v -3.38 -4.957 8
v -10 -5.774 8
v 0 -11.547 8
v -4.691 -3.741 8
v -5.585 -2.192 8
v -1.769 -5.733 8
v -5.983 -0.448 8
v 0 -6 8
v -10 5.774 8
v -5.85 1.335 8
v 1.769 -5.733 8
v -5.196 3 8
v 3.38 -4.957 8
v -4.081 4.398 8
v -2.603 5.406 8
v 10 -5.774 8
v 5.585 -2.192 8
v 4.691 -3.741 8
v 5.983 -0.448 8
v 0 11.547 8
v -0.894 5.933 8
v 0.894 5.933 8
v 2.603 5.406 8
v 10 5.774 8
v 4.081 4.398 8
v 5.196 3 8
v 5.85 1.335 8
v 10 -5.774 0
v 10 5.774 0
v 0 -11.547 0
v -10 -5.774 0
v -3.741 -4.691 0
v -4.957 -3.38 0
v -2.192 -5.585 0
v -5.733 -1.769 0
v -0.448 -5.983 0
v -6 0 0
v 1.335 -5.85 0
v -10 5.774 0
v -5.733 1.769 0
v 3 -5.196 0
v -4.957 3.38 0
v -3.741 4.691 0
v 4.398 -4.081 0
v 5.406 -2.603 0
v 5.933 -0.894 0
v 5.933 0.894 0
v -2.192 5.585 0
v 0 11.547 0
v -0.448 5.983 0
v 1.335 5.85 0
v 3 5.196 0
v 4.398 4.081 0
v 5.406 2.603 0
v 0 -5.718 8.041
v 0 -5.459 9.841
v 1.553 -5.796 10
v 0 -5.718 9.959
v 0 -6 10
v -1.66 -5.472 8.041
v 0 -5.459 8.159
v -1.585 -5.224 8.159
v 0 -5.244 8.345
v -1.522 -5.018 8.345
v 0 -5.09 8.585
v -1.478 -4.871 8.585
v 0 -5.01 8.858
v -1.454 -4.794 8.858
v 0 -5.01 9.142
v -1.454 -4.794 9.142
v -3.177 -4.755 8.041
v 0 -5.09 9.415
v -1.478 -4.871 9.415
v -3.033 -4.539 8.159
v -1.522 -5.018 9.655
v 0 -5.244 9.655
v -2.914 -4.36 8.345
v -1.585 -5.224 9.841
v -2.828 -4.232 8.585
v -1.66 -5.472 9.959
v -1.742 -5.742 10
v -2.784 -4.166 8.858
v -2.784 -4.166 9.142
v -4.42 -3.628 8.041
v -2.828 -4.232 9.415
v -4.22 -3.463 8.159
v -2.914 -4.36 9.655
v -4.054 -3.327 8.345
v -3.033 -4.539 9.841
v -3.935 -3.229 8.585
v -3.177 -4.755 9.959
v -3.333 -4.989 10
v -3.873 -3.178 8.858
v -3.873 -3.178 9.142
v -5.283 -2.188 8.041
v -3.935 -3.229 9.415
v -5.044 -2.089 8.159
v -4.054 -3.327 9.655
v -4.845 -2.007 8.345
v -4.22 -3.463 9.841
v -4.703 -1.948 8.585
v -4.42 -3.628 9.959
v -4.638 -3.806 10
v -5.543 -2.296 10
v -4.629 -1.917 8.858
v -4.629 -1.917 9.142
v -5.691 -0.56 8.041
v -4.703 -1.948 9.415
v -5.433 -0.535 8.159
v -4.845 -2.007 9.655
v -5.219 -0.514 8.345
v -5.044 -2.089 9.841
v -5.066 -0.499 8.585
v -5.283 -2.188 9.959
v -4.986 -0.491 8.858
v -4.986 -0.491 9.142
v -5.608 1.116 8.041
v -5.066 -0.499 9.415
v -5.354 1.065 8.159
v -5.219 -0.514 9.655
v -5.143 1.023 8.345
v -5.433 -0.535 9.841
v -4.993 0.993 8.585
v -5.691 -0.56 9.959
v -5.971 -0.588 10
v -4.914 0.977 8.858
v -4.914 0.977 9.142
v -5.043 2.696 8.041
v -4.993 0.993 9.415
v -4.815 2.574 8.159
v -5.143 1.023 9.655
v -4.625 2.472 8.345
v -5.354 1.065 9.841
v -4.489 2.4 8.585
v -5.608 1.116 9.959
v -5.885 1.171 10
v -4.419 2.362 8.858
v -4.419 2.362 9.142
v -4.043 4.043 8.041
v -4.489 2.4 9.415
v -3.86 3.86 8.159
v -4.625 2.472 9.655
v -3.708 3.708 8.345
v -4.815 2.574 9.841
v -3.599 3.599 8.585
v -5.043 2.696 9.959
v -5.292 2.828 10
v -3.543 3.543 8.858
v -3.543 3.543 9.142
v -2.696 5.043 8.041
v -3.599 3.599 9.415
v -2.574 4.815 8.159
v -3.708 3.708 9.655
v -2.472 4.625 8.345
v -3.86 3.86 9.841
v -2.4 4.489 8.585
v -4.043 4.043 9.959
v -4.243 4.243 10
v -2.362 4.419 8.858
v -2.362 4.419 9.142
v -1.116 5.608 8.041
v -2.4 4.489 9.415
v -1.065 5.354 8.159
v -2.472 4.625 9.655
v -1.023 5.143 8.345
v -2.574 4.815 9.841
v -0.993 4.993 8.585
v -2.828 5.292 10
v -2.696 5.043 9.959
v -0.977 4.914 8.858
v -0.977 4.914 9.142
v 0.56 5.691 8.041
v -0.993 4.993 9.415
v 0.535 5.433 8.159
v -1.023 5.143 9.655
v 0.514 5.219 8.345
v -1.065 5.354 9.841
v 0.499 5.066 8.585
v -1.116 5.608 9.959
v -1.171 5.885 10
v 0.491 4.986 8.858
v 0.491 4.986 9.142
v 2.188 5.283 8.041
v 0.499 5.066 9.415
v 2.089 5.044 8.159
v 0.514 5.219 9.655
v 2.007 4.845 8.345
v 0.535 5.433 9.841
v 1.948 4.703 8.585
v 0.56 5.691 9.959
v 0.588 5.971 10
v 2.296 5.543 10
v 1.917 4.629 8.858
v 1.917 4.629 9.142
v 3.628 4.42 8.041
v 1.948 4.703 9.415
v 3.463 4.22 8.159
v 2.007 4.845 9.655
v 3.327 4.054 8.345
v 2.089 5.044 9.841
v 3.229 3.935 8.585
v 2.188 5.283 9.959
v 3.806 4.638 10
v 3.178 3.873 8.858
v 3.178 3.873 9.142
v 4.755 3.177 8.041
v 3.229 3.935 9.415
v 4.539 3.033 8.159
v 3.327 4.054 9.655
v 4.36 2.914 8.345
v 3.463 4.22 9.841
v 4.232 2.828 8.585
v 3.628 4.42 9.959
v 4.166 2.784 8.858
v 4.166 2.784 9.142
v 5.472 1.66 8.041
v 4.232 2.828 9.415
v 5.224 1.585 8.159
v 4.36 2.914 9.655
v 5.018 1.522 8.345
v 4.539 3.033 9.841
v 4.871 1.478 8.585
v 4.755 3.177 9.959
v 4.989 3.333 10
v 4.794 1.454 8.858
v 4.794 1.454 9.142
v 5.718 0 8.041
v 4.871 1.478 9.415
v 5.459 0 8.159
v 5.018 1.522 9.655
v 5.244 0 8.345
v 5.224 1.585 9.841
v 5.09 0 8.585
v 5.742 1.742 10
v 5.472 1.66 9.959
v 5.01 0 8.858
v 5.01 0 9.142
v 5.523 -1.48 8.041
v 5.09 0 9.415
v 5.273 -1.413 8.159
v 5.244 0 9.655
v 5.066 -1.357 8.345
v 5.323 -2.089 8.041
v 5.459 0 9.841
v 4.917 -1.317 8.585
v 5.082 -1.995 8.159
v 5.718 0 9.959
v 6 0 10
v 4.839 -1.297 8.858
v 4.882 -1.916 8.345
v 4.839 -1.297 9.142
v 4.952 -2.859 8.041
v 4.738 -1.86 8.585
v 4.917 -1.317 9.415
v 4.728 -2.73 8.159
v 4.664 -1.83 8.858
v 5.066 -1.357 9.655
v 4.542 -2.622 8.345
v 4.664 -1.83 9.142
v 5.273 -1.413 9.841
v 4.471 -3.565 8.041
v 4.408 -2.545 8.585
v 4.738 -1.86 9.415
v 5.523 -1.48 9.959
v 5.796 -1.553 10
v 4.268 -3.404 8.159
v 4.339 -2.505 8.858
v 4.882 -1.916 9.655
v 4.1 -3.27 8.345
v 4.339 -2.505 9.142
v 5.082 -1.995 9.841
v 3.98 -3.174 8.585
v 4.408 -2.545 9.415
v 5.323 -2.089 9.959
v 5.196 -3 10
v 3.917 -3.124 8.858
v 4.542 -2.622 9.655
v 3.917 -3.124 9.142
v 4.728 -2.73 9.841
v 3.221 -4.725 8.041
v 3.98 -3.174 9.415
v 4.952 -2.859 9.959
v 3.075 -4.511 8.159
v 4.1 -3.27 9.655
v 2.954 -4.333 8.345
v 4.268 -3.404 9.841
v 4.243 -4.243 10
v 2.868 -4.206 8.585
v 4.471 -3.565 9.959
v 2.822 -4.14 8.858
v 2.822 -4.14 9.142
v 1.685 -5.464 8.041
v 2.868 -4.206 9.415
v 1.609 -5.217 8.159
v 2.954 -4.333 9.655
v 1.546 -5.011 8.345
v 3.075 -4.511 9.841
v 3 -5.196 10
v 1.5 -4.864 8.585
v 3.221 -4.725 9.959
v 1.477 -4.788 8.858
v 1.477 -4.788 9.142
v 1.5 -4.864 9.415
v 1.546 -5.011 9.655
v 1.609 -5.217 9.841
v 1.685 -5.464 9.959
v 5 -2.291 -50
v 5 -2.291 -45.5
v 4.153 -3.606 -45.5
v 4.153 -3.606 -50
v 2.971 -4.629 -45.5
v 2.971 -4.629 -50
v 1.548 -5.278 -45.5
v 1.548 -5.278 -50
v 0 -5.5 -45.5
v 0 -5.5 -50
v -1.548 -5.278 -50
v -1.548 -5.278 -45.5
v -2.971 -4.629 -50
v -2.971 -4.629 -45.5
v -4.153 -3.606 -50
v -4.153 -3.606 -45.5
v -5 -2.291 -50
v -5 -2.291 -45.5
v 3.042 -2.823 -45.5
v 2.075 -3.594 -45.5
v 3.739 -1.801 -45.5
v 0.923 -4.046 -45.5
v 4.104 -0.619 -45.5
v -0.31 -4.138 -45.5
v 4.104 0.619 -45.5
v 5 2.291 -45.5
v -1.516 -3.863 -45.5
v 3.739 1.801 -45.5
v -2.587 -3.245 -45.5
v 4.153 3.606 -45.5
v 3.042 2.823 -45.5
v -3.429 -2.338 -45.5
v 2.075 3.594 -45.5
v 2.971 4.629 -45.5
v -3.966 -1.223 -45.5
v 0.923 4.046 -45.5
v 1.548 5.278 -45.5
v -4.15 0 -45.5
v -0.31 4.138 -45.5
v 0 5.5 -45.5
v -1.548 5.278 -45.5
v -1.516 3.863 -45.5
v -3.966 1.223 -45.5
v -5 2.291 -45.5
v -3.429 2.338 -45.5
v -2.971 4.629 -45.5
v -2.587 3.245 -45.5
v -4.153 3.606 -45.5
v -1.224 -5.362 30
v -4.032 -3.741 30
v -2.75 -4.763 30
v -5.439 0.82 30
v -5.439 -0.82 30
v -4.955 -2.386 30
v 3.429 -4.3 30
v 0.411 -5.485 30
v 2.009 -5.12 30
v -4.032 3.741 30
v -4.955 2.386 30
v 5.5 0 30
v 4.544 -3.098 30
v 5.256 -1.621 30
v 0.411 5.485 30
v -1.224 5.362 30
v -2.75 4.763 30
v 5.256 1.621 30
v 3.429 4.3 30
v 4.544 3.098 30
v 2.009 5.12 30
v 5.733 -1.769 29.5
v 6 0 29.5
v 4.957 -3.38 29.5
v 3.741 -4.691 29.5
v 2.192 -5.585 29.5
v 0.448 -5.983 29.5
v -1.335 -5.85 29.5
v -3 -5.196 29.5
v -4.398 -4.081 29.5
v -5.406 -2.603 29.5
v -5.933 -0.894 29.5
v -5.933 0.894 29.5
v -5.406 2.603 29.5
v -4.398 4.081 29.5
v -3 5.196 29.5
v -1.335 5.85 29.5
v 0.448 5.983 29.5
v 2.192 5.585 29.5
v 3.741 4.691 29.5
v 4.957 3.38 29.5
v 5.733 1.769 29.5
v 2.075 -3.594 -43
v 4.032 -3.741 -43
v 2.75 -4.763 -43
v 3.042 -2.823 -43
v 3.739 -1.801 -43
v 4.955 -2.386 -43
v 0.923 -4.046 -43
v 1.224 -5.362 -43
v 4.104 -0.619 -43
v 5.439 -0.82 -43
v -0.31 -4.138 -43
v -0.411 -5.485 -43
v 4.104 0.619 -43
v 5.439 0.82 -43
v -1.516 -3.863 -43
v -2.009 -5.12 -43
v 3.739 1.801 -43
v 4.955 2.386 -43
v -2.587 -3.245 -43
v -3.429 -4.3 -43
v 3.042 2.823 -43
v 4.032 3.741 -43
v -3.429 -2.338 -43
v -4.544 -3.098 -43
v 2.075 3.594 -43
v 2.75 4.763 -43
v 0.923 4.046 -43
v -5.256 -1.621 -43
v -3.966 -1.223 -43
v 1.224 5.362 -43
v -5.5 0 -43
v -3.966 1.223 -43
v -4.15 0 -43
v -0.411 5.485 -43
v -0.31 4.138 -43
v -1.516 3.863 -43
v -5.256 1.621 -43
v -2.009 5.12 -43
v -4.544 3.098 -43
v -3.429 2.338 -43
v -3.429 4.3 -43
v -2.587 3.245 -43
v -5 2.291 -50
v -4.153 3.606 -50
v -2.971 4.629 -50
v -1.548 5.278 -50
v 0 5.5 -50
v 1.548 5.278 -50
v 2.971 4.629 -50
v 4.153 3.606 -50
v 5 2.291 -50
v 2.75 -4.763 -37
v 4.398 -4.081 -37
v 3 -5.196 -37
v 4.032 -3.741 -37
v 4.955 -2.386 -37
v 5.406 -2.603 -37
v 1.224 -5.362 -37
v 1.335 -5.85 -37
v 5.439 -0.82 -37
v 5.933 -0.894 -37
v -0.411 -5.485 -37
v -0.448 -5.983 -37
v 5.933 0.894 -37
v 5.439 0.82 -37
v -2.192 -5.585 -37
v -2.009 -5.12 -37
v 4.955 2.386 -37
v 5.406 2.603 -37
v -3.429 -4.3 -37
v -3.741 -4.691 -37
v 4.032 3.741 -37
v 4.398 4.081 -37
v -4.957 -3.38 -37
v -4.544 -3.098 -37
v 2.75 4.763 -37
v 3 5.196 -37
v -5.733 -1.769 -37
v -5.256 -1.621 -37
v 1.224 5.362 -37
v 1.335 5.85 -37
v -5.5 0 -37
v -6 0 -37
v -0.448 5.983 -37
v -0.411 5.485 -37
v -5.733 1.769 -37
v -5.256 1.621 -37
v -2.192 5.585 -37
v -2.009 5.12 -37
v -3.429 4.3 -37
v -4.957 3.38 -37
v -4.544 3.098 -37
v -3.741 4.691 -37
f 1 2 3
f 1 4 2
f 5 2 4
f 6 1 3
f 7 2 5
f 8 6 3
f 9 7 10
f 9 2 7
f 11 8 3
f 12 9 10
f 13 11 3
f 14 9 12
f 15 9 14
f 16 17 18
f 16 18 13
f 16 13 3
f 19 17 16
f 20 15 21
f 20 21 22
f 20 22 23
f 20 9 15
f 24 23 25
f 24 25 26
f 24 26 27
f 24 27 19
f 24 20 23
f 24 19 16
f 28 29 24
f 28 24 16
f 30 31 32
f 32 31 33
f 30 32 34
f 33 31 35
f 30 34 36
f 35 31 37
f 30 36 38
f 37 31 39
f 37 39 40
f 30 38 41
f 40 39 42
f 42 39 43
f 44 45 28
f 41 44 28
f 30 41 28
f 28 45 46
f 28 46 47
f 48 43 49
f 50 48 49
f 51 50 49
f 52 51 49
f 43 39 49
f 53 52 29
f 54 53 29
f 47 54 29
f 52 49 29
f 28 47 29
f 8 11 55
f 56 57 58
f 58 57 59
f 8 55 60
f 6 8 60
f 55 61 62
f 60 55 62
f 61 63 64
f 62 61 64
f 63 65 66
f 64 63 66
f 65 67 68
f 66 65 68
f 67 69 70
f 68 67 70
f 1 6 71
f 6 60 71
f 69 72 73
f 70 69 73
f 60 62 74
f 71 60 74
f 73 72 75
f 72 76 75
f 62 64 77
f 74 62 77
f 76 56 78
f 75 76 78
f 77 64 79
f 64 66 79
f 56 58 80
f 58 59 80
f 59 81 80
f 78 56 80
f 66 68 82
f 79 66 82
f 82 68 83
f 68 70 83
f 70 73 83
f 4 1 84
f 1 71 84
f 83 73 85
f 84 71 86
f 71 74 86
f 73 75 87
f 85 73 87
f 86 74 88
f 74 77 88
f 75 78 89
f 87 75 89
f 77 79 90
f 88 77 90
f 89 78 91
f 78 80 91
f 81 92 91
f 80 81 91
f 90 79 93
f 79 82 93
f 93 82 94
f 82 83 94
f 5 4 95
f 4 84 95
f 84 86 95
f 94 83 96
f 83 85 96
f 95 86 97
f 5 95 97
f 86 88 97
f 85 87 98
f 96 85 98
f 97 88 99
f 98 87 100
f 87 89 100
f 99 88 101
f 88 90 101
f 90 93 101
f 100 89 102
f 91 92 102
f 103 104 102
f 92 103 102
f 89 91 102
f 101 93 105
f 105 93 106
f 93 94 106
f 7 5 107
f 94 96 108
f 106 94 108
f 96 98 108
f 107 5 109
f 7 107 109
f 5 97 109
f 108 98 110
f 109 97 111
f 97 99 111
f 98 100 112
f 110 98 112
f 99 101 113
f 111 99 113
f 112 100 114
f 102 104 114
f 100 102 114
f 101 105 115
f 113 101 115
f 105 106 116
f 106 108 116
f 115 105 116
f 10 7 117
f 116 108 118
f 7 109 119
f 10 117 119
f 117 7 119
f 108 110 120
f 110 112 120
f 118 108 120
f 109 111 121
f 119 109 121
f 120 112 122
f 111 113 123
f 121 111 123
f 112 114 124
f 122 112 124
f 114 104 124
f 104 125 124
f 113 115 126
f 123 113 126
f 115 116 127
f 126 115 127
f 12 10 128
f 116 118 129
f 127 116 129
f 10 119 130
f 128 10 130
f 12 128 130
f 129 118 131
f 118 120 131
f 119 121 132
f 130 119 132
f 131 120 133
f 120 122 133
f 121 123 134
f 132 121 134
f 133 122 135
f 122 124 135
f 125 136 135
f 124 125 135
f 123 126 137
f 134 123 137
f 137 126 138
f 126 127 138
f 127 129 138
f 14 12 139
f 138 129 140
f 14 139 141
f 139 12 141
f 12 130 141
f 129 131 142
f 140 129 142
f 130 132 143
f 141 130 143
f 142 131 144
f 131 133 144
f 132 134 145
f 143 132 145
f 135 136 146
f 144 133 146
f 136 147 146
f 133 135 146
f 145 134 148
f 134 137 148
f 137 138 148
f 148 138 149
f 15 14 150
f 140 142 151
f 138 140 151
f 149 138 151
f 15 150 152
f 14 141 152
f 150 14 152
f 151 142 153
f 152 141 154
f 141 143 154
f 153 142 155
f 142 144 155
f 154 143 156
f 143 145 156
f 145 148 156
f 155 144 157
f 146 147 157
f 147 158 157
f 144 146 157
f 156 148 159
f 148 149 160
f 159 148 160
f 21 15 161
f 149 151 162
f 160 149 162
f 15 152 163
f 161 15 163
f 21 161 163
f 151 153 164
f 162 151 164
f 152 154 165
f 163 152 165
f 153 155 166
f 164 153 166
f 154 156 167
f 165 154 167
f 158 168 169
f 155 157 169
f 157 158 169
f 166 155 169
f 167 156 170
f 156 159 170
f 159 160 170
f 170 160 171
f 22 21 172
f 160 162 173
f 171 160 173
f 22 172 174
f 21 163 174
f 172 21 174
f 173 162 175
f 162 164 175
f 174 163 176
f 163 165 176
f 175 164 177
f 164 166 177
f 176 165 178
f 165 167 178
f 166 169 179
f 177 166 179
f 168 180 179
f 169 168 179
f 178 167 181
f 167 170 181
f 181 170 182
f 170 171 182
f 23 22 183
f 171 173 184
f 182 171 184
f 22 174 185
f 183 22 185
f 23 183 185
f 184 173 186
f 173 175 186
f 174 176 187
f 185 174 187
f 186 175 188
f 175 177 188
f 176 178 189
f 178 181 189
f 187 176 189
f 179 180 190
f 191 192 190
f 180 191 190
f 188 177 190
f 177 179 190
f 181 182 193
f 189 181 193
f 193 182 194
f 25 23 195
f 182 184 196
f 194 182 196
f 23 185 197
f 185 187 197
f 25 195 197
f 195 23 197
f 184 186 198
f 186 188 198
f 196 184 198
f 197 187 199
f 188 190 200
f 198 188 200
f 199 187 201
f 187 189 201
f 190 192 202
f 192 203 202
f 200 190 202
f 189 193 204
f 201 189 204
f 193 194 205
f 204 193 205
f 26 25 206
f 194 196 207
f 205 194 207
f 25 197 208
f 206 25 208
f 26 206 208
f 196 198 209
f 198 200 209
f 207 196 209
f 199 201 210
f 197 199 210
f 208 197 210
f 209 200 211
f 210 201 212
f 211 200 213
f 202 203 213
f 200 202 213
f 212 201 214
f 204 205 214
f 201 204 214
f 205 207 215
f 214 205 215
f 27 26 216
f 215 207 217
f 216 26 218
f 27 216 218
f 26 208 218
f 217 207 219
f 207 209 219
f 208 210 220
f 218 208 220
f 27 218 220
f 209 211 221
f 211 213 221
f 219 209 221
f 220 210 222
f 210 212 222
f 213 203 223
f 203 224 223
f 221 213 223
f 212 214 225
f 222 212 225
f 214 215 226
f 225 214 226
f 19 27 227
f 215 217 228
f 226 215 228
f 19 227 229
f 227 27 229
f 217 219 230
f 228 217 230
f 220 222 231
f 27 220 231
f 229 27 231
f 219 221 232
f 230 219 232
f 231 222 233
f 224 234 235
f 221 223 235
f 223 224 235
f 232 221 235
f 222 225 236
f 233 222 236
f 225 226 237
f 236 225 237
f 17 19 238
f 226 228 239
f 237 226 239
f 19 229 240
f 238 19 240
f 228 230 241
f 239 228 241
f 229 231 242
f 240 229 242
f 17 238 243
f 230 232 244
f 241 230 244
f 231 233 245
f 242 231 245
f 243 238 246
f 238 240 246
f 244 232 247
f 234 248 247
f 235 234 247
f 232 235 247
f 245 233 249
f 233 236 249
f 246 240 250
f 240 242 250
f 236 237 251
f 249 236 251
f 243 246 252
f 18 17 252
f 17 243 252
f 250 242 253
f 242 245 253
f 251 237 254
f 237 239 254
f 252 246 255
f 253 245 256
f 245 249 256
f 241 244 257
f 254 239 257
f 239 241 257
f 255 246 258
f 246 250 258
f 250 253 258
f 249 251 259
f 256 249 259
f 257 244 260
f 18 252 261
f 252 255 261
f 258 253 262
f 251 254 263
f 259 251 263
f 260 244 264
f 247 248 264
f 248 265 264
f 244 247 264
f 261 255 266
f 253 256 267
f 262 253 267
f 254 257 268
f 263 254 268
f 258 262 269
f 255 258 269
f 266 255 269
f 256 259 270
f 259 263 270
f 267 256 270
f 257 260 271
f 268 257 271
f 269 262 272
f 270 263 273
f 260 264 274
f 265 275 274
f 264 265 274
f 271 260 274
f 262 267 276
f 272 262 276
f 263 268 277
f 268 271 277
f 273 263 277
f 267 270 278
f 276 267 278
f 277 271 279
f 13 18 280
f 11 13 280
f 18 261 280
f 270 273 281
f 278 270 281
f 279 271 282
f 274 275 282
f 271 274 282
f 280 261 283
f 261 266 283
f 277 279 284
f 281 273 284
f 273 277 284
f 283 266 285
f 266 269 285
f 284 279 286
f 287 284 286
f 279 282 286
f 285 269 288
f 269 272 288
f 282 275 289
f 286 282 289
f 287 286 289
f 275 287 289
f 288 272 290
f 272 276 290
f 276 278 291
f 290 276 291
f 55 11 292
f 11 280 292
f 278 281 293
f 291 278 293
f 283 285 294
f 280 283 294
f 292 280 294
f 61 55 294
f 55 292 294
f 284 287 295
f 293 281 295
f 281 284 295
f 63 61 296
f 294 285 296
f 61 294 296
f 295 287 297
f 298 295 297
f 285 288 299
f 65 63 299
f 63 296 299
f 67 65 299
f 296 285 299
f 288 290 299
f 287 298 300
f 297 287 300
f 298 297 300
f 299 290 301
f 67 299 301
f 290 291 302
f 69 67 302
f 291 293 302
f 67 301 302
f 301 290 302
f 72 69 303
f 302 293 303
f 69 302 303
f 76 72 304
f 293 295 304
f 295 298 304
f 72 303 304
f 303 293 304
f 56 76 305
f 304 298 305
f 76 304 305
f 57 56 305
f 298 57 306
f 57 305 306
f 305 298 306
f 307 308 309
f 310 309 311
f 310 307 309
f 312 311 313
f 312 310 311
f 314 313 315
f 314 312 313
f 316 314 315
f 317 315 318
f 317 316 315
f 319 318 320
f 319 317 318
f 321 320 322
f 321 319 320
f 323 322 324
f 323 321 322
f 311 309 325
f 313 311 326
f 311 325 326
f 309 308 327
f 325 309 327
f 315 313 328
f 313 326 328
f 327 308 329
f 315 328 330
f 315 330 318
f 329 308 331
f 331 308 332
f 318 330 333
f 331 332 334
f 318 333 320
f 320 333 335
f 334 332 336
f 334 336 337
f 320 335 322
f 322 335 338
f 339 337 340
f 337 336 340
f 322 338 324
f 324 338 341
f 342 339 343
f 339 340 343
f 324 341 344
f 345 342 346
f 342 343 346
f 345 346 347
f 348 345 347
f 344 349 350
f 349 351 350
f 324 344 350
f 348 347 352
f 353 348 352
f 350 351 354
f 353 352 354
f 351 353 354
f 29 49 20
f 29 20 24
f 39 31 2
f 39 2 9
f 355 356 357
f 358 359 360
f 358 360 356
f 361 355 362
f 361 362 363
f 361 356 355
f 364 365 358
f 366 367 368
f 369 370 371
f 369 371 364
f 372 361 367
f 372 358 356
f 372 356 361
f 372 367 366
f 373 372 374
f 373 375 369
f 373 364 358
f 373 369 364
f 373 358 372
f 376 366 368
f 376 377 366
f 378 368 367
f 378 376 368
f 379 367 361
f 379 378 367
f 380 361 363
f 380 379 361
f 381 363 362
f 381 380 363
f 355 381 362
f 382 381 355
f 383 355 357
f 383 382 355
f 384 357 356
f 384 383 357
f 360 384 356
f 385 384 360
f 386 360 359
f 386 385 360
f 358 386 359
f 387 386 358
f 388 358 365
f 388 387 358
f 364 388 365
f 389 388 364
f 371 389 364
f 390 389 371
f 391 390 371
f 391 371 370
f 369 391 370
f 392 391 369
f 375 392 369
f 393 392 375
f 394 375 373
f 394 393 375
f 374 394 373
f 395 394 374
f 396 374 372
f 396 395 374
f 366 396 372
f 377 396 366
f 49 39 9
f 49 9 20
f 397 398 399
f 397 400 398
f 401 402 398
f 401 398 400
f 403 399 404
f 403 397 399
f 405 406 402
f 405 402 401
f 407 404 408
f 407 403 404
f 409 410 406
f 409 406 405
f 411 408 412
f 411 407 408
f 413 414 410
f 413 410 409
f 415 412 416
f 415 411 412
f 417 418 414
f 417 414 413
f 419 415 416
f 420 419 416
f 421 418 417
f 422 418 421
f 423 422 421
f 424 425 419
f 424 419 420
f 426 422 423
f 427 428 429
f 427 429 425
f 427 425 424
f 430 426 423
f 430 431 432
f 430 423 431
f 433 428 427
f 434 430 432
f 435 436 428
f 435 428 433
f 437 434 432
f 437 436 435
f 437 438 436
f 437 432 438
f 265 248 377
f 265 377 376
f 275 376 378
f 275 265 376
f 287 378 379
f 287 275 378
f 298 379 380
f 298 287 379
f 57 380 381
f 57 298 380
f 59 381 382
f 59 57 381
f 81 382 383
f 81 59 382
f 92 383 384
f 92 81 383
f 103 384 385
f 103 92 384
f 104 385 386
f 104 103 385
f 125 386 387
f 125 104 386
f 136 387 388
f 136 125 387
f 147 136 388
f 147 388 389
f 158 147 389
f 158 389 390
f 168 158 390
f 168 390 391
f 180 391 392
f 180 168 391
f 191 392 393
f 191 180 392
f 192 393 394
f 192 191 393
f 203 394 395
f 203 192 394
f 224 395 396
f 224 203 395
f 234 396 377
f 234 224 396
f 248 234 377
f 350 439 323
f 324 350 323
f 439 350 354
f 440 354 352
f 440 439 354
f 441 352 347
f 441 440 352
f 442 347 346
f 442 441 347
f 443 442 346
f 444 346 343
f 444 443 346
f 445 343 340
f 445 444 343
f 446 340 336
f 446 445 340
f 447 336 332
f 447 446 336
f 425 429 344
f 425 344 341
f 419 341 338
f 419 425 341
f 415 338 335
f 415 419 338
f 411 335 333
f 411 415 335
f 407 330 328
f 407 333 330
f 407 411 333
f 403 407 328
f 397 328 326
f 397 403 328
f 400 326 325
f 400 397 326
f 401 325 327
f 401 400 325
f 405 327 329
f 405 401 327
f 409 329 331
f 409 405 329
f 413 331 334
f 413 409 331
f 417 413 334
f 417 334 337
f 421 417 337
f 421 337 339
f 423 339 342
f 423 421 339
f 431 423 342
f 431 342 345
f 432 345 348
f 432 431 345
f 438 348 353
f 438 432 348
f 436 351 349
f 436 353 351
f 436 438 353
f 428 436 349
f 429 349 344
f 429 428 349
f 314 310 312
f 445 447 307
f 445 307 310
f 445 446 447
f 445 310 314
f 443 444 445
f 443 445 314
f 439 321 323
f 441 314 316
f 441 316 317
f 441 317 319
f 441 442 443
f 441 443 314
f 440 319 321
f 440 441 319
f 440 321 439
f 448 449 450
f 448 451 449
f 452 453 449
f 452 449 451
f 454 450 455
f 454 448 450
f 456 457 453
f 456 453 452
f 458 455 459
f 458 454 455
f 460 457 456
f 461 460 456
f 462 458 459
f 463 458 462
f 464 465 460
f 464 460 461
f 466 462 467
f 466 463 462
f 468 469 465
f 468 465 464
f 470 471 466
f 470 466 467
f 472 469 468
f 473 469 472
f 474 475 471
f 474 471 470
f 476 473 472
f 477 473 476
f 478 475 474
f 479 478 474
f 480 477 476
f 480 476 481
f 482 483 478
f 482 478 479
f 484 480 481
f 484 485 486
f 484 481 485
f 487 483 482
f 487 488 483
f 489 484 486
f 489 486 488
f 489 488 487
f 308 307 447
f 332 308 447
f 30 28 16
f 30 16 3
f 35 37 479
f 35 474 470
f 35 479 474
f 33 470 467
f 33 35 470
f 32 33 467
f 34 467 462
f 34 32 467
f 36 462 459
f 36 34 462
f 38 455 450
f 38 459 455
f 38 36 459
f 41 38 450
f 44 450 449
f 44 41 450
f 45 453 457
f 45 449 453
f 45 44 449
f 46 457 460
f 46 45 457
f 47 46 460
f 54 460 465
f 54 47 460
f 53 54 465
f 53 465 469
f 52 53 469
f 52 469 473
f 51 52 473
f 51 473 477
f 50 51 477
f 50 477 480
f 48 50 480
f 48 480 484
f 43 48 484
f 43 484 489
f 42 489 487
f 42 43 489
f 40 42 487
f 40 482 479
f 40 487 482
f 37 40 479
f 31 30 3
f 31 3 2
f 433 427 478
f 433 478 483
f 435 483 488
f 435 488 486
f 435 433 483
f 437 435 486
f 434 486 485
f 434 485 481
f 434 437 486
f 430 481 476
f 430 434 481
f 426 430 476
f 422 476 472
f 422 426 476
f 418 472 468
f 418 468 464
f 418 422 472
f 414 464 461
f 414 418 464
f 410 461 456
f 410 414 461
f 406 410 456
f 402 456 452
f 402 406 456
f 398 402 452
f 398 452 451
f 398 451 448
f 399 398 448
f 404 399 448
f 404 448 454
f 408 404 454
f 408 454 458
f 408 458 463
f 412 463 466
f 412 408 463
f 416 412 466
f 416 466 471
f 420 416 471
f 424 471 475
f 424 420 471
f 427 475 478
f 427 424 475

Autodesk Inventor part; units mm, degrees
sketch "草圖1" plane through (0, 0, 0) normal (0, 0, 1) x (1, 0, 0)
  line L0 (0, -11.547) -> (-10, -5.7735)
  line L1 (-10, -5.7735) -> (-10, 5.7735)
  line L2 (-10, 5.7735) -> (0, 11.547)
  line L3 (0, 11.547) -> (10, 5.7735)
  line L4 (10, 5.7735) -> (10, -5.7735)
  line L5 (10, -5.7735) -> (0, -11.547)
  point P0 (0, 0)
  point P1 (0, 0)
  dimension "d16" = 20
extrude "擠出1" add sketch "草圖1" along normal blind 8
sketch "草圖2" plane through (0, 0, 8) normal (0, 0, 1) x (1, 0, 0)
  circle A0 centre (0, 0) radius 6
  dimension "d3" = 12
extrude "擠出2" add sketch "草圖2" along normal blind 22
thread "螺紋1" size "M12x1.75" class "6g" standard "ANSI Metric M Profile" full length
sketch "草圖3" plane through (0, 0, 0) normal (0, 0, -1) x (-1, 0, 0)
  circle A0 centre (0, 0) radius 6
  dimension "d8" = 12
extrude "擠出3" add sketch "草圖3" along normal blind 50
ref_plane "工作平面1" through (0, 0, -43) normal (0, 0, -1) x (-1, 0, 0)
sketch "草圖4" plane through (0, 0, -43) normal (0, 0, -1) x (-1, 0, 0)
  circle A0 centre (0, 0) radius 4.15
  circle A1 centre (0, 0) radius 6
  dimension "d12" = 8.3
  dimension "d13" = 12
extrude "擠出4" cut sketch "草圖4" along normal blind 2.5
ref_plane "工作平面6" through (0, 0, 0) normal (0, 1, 0) x (-1, 0, 0)
chamfer "倒角1" distance 0.5 angle 45 1 edges at (-6, 0, 30)
ref_plane "工作平面8" through (0, 0, 0) normal (1, 0, 0) x (0, 1, 0)
sketch "草圖7" plane through (0, 0, 0) normal (1, 0, 0) x (0, 1, 0)
  line L0 (-5.5, 30) -> (5.5, 30) projected
  line L1 (-6, 8) -> (6, 8) projected
  line L2 (6, 29.5) -> (-6, 29.5) projected
  line L3 (-6, 8) -> (-6, 9)
  arc A0 (-6, 8) -> (-6, 10) centre (-6, 9) ccw
  line L4 (-6, 10) -> (-6, 8)
  line L5 (0, -6) -> (0, 36) projected
  point P0 (0, 0)
revolve "迴轉1" cut sketch "草圖7" angle 360 about axis through (0, 0, -10) along (0, 0, 1)
sketch "草圖10" plane through (0, 0, -50) normal (0, 0, -1) x (-1, 0, 0)
  line L0 (-5, -2.2913) -> (-5, 2.2913)
  line L1 (5, 2.2913) -> (5, -2.2913)
  circle A0 centre (0, 0) radius 5.5 projected
  point P0 (5, -2.8868)
  point P1 (-5, -2.8868)
  point P2 (5, 2.8868)
  dimension "d40" = 10
sketch "草圖11" plane through (0, 0, -50) normal (0, 0, -1) x (-1, 0, 0)
  arc A0 (6, 0) -> (6, 0) centre (0, 0) ccw projected
  circle A1 centre (0, 0) radius 5.5
  circle A2 centre (0, 0) radius 6
  dimension "d45" = 11
extrude "擠出10" cut sketch "草圖11" against normal blind 13
extrude "擠出11" cut sketch "草圖10" against normal up to next contours A0 L0 | L1 A0
properties part number "移動輪固定軸"
